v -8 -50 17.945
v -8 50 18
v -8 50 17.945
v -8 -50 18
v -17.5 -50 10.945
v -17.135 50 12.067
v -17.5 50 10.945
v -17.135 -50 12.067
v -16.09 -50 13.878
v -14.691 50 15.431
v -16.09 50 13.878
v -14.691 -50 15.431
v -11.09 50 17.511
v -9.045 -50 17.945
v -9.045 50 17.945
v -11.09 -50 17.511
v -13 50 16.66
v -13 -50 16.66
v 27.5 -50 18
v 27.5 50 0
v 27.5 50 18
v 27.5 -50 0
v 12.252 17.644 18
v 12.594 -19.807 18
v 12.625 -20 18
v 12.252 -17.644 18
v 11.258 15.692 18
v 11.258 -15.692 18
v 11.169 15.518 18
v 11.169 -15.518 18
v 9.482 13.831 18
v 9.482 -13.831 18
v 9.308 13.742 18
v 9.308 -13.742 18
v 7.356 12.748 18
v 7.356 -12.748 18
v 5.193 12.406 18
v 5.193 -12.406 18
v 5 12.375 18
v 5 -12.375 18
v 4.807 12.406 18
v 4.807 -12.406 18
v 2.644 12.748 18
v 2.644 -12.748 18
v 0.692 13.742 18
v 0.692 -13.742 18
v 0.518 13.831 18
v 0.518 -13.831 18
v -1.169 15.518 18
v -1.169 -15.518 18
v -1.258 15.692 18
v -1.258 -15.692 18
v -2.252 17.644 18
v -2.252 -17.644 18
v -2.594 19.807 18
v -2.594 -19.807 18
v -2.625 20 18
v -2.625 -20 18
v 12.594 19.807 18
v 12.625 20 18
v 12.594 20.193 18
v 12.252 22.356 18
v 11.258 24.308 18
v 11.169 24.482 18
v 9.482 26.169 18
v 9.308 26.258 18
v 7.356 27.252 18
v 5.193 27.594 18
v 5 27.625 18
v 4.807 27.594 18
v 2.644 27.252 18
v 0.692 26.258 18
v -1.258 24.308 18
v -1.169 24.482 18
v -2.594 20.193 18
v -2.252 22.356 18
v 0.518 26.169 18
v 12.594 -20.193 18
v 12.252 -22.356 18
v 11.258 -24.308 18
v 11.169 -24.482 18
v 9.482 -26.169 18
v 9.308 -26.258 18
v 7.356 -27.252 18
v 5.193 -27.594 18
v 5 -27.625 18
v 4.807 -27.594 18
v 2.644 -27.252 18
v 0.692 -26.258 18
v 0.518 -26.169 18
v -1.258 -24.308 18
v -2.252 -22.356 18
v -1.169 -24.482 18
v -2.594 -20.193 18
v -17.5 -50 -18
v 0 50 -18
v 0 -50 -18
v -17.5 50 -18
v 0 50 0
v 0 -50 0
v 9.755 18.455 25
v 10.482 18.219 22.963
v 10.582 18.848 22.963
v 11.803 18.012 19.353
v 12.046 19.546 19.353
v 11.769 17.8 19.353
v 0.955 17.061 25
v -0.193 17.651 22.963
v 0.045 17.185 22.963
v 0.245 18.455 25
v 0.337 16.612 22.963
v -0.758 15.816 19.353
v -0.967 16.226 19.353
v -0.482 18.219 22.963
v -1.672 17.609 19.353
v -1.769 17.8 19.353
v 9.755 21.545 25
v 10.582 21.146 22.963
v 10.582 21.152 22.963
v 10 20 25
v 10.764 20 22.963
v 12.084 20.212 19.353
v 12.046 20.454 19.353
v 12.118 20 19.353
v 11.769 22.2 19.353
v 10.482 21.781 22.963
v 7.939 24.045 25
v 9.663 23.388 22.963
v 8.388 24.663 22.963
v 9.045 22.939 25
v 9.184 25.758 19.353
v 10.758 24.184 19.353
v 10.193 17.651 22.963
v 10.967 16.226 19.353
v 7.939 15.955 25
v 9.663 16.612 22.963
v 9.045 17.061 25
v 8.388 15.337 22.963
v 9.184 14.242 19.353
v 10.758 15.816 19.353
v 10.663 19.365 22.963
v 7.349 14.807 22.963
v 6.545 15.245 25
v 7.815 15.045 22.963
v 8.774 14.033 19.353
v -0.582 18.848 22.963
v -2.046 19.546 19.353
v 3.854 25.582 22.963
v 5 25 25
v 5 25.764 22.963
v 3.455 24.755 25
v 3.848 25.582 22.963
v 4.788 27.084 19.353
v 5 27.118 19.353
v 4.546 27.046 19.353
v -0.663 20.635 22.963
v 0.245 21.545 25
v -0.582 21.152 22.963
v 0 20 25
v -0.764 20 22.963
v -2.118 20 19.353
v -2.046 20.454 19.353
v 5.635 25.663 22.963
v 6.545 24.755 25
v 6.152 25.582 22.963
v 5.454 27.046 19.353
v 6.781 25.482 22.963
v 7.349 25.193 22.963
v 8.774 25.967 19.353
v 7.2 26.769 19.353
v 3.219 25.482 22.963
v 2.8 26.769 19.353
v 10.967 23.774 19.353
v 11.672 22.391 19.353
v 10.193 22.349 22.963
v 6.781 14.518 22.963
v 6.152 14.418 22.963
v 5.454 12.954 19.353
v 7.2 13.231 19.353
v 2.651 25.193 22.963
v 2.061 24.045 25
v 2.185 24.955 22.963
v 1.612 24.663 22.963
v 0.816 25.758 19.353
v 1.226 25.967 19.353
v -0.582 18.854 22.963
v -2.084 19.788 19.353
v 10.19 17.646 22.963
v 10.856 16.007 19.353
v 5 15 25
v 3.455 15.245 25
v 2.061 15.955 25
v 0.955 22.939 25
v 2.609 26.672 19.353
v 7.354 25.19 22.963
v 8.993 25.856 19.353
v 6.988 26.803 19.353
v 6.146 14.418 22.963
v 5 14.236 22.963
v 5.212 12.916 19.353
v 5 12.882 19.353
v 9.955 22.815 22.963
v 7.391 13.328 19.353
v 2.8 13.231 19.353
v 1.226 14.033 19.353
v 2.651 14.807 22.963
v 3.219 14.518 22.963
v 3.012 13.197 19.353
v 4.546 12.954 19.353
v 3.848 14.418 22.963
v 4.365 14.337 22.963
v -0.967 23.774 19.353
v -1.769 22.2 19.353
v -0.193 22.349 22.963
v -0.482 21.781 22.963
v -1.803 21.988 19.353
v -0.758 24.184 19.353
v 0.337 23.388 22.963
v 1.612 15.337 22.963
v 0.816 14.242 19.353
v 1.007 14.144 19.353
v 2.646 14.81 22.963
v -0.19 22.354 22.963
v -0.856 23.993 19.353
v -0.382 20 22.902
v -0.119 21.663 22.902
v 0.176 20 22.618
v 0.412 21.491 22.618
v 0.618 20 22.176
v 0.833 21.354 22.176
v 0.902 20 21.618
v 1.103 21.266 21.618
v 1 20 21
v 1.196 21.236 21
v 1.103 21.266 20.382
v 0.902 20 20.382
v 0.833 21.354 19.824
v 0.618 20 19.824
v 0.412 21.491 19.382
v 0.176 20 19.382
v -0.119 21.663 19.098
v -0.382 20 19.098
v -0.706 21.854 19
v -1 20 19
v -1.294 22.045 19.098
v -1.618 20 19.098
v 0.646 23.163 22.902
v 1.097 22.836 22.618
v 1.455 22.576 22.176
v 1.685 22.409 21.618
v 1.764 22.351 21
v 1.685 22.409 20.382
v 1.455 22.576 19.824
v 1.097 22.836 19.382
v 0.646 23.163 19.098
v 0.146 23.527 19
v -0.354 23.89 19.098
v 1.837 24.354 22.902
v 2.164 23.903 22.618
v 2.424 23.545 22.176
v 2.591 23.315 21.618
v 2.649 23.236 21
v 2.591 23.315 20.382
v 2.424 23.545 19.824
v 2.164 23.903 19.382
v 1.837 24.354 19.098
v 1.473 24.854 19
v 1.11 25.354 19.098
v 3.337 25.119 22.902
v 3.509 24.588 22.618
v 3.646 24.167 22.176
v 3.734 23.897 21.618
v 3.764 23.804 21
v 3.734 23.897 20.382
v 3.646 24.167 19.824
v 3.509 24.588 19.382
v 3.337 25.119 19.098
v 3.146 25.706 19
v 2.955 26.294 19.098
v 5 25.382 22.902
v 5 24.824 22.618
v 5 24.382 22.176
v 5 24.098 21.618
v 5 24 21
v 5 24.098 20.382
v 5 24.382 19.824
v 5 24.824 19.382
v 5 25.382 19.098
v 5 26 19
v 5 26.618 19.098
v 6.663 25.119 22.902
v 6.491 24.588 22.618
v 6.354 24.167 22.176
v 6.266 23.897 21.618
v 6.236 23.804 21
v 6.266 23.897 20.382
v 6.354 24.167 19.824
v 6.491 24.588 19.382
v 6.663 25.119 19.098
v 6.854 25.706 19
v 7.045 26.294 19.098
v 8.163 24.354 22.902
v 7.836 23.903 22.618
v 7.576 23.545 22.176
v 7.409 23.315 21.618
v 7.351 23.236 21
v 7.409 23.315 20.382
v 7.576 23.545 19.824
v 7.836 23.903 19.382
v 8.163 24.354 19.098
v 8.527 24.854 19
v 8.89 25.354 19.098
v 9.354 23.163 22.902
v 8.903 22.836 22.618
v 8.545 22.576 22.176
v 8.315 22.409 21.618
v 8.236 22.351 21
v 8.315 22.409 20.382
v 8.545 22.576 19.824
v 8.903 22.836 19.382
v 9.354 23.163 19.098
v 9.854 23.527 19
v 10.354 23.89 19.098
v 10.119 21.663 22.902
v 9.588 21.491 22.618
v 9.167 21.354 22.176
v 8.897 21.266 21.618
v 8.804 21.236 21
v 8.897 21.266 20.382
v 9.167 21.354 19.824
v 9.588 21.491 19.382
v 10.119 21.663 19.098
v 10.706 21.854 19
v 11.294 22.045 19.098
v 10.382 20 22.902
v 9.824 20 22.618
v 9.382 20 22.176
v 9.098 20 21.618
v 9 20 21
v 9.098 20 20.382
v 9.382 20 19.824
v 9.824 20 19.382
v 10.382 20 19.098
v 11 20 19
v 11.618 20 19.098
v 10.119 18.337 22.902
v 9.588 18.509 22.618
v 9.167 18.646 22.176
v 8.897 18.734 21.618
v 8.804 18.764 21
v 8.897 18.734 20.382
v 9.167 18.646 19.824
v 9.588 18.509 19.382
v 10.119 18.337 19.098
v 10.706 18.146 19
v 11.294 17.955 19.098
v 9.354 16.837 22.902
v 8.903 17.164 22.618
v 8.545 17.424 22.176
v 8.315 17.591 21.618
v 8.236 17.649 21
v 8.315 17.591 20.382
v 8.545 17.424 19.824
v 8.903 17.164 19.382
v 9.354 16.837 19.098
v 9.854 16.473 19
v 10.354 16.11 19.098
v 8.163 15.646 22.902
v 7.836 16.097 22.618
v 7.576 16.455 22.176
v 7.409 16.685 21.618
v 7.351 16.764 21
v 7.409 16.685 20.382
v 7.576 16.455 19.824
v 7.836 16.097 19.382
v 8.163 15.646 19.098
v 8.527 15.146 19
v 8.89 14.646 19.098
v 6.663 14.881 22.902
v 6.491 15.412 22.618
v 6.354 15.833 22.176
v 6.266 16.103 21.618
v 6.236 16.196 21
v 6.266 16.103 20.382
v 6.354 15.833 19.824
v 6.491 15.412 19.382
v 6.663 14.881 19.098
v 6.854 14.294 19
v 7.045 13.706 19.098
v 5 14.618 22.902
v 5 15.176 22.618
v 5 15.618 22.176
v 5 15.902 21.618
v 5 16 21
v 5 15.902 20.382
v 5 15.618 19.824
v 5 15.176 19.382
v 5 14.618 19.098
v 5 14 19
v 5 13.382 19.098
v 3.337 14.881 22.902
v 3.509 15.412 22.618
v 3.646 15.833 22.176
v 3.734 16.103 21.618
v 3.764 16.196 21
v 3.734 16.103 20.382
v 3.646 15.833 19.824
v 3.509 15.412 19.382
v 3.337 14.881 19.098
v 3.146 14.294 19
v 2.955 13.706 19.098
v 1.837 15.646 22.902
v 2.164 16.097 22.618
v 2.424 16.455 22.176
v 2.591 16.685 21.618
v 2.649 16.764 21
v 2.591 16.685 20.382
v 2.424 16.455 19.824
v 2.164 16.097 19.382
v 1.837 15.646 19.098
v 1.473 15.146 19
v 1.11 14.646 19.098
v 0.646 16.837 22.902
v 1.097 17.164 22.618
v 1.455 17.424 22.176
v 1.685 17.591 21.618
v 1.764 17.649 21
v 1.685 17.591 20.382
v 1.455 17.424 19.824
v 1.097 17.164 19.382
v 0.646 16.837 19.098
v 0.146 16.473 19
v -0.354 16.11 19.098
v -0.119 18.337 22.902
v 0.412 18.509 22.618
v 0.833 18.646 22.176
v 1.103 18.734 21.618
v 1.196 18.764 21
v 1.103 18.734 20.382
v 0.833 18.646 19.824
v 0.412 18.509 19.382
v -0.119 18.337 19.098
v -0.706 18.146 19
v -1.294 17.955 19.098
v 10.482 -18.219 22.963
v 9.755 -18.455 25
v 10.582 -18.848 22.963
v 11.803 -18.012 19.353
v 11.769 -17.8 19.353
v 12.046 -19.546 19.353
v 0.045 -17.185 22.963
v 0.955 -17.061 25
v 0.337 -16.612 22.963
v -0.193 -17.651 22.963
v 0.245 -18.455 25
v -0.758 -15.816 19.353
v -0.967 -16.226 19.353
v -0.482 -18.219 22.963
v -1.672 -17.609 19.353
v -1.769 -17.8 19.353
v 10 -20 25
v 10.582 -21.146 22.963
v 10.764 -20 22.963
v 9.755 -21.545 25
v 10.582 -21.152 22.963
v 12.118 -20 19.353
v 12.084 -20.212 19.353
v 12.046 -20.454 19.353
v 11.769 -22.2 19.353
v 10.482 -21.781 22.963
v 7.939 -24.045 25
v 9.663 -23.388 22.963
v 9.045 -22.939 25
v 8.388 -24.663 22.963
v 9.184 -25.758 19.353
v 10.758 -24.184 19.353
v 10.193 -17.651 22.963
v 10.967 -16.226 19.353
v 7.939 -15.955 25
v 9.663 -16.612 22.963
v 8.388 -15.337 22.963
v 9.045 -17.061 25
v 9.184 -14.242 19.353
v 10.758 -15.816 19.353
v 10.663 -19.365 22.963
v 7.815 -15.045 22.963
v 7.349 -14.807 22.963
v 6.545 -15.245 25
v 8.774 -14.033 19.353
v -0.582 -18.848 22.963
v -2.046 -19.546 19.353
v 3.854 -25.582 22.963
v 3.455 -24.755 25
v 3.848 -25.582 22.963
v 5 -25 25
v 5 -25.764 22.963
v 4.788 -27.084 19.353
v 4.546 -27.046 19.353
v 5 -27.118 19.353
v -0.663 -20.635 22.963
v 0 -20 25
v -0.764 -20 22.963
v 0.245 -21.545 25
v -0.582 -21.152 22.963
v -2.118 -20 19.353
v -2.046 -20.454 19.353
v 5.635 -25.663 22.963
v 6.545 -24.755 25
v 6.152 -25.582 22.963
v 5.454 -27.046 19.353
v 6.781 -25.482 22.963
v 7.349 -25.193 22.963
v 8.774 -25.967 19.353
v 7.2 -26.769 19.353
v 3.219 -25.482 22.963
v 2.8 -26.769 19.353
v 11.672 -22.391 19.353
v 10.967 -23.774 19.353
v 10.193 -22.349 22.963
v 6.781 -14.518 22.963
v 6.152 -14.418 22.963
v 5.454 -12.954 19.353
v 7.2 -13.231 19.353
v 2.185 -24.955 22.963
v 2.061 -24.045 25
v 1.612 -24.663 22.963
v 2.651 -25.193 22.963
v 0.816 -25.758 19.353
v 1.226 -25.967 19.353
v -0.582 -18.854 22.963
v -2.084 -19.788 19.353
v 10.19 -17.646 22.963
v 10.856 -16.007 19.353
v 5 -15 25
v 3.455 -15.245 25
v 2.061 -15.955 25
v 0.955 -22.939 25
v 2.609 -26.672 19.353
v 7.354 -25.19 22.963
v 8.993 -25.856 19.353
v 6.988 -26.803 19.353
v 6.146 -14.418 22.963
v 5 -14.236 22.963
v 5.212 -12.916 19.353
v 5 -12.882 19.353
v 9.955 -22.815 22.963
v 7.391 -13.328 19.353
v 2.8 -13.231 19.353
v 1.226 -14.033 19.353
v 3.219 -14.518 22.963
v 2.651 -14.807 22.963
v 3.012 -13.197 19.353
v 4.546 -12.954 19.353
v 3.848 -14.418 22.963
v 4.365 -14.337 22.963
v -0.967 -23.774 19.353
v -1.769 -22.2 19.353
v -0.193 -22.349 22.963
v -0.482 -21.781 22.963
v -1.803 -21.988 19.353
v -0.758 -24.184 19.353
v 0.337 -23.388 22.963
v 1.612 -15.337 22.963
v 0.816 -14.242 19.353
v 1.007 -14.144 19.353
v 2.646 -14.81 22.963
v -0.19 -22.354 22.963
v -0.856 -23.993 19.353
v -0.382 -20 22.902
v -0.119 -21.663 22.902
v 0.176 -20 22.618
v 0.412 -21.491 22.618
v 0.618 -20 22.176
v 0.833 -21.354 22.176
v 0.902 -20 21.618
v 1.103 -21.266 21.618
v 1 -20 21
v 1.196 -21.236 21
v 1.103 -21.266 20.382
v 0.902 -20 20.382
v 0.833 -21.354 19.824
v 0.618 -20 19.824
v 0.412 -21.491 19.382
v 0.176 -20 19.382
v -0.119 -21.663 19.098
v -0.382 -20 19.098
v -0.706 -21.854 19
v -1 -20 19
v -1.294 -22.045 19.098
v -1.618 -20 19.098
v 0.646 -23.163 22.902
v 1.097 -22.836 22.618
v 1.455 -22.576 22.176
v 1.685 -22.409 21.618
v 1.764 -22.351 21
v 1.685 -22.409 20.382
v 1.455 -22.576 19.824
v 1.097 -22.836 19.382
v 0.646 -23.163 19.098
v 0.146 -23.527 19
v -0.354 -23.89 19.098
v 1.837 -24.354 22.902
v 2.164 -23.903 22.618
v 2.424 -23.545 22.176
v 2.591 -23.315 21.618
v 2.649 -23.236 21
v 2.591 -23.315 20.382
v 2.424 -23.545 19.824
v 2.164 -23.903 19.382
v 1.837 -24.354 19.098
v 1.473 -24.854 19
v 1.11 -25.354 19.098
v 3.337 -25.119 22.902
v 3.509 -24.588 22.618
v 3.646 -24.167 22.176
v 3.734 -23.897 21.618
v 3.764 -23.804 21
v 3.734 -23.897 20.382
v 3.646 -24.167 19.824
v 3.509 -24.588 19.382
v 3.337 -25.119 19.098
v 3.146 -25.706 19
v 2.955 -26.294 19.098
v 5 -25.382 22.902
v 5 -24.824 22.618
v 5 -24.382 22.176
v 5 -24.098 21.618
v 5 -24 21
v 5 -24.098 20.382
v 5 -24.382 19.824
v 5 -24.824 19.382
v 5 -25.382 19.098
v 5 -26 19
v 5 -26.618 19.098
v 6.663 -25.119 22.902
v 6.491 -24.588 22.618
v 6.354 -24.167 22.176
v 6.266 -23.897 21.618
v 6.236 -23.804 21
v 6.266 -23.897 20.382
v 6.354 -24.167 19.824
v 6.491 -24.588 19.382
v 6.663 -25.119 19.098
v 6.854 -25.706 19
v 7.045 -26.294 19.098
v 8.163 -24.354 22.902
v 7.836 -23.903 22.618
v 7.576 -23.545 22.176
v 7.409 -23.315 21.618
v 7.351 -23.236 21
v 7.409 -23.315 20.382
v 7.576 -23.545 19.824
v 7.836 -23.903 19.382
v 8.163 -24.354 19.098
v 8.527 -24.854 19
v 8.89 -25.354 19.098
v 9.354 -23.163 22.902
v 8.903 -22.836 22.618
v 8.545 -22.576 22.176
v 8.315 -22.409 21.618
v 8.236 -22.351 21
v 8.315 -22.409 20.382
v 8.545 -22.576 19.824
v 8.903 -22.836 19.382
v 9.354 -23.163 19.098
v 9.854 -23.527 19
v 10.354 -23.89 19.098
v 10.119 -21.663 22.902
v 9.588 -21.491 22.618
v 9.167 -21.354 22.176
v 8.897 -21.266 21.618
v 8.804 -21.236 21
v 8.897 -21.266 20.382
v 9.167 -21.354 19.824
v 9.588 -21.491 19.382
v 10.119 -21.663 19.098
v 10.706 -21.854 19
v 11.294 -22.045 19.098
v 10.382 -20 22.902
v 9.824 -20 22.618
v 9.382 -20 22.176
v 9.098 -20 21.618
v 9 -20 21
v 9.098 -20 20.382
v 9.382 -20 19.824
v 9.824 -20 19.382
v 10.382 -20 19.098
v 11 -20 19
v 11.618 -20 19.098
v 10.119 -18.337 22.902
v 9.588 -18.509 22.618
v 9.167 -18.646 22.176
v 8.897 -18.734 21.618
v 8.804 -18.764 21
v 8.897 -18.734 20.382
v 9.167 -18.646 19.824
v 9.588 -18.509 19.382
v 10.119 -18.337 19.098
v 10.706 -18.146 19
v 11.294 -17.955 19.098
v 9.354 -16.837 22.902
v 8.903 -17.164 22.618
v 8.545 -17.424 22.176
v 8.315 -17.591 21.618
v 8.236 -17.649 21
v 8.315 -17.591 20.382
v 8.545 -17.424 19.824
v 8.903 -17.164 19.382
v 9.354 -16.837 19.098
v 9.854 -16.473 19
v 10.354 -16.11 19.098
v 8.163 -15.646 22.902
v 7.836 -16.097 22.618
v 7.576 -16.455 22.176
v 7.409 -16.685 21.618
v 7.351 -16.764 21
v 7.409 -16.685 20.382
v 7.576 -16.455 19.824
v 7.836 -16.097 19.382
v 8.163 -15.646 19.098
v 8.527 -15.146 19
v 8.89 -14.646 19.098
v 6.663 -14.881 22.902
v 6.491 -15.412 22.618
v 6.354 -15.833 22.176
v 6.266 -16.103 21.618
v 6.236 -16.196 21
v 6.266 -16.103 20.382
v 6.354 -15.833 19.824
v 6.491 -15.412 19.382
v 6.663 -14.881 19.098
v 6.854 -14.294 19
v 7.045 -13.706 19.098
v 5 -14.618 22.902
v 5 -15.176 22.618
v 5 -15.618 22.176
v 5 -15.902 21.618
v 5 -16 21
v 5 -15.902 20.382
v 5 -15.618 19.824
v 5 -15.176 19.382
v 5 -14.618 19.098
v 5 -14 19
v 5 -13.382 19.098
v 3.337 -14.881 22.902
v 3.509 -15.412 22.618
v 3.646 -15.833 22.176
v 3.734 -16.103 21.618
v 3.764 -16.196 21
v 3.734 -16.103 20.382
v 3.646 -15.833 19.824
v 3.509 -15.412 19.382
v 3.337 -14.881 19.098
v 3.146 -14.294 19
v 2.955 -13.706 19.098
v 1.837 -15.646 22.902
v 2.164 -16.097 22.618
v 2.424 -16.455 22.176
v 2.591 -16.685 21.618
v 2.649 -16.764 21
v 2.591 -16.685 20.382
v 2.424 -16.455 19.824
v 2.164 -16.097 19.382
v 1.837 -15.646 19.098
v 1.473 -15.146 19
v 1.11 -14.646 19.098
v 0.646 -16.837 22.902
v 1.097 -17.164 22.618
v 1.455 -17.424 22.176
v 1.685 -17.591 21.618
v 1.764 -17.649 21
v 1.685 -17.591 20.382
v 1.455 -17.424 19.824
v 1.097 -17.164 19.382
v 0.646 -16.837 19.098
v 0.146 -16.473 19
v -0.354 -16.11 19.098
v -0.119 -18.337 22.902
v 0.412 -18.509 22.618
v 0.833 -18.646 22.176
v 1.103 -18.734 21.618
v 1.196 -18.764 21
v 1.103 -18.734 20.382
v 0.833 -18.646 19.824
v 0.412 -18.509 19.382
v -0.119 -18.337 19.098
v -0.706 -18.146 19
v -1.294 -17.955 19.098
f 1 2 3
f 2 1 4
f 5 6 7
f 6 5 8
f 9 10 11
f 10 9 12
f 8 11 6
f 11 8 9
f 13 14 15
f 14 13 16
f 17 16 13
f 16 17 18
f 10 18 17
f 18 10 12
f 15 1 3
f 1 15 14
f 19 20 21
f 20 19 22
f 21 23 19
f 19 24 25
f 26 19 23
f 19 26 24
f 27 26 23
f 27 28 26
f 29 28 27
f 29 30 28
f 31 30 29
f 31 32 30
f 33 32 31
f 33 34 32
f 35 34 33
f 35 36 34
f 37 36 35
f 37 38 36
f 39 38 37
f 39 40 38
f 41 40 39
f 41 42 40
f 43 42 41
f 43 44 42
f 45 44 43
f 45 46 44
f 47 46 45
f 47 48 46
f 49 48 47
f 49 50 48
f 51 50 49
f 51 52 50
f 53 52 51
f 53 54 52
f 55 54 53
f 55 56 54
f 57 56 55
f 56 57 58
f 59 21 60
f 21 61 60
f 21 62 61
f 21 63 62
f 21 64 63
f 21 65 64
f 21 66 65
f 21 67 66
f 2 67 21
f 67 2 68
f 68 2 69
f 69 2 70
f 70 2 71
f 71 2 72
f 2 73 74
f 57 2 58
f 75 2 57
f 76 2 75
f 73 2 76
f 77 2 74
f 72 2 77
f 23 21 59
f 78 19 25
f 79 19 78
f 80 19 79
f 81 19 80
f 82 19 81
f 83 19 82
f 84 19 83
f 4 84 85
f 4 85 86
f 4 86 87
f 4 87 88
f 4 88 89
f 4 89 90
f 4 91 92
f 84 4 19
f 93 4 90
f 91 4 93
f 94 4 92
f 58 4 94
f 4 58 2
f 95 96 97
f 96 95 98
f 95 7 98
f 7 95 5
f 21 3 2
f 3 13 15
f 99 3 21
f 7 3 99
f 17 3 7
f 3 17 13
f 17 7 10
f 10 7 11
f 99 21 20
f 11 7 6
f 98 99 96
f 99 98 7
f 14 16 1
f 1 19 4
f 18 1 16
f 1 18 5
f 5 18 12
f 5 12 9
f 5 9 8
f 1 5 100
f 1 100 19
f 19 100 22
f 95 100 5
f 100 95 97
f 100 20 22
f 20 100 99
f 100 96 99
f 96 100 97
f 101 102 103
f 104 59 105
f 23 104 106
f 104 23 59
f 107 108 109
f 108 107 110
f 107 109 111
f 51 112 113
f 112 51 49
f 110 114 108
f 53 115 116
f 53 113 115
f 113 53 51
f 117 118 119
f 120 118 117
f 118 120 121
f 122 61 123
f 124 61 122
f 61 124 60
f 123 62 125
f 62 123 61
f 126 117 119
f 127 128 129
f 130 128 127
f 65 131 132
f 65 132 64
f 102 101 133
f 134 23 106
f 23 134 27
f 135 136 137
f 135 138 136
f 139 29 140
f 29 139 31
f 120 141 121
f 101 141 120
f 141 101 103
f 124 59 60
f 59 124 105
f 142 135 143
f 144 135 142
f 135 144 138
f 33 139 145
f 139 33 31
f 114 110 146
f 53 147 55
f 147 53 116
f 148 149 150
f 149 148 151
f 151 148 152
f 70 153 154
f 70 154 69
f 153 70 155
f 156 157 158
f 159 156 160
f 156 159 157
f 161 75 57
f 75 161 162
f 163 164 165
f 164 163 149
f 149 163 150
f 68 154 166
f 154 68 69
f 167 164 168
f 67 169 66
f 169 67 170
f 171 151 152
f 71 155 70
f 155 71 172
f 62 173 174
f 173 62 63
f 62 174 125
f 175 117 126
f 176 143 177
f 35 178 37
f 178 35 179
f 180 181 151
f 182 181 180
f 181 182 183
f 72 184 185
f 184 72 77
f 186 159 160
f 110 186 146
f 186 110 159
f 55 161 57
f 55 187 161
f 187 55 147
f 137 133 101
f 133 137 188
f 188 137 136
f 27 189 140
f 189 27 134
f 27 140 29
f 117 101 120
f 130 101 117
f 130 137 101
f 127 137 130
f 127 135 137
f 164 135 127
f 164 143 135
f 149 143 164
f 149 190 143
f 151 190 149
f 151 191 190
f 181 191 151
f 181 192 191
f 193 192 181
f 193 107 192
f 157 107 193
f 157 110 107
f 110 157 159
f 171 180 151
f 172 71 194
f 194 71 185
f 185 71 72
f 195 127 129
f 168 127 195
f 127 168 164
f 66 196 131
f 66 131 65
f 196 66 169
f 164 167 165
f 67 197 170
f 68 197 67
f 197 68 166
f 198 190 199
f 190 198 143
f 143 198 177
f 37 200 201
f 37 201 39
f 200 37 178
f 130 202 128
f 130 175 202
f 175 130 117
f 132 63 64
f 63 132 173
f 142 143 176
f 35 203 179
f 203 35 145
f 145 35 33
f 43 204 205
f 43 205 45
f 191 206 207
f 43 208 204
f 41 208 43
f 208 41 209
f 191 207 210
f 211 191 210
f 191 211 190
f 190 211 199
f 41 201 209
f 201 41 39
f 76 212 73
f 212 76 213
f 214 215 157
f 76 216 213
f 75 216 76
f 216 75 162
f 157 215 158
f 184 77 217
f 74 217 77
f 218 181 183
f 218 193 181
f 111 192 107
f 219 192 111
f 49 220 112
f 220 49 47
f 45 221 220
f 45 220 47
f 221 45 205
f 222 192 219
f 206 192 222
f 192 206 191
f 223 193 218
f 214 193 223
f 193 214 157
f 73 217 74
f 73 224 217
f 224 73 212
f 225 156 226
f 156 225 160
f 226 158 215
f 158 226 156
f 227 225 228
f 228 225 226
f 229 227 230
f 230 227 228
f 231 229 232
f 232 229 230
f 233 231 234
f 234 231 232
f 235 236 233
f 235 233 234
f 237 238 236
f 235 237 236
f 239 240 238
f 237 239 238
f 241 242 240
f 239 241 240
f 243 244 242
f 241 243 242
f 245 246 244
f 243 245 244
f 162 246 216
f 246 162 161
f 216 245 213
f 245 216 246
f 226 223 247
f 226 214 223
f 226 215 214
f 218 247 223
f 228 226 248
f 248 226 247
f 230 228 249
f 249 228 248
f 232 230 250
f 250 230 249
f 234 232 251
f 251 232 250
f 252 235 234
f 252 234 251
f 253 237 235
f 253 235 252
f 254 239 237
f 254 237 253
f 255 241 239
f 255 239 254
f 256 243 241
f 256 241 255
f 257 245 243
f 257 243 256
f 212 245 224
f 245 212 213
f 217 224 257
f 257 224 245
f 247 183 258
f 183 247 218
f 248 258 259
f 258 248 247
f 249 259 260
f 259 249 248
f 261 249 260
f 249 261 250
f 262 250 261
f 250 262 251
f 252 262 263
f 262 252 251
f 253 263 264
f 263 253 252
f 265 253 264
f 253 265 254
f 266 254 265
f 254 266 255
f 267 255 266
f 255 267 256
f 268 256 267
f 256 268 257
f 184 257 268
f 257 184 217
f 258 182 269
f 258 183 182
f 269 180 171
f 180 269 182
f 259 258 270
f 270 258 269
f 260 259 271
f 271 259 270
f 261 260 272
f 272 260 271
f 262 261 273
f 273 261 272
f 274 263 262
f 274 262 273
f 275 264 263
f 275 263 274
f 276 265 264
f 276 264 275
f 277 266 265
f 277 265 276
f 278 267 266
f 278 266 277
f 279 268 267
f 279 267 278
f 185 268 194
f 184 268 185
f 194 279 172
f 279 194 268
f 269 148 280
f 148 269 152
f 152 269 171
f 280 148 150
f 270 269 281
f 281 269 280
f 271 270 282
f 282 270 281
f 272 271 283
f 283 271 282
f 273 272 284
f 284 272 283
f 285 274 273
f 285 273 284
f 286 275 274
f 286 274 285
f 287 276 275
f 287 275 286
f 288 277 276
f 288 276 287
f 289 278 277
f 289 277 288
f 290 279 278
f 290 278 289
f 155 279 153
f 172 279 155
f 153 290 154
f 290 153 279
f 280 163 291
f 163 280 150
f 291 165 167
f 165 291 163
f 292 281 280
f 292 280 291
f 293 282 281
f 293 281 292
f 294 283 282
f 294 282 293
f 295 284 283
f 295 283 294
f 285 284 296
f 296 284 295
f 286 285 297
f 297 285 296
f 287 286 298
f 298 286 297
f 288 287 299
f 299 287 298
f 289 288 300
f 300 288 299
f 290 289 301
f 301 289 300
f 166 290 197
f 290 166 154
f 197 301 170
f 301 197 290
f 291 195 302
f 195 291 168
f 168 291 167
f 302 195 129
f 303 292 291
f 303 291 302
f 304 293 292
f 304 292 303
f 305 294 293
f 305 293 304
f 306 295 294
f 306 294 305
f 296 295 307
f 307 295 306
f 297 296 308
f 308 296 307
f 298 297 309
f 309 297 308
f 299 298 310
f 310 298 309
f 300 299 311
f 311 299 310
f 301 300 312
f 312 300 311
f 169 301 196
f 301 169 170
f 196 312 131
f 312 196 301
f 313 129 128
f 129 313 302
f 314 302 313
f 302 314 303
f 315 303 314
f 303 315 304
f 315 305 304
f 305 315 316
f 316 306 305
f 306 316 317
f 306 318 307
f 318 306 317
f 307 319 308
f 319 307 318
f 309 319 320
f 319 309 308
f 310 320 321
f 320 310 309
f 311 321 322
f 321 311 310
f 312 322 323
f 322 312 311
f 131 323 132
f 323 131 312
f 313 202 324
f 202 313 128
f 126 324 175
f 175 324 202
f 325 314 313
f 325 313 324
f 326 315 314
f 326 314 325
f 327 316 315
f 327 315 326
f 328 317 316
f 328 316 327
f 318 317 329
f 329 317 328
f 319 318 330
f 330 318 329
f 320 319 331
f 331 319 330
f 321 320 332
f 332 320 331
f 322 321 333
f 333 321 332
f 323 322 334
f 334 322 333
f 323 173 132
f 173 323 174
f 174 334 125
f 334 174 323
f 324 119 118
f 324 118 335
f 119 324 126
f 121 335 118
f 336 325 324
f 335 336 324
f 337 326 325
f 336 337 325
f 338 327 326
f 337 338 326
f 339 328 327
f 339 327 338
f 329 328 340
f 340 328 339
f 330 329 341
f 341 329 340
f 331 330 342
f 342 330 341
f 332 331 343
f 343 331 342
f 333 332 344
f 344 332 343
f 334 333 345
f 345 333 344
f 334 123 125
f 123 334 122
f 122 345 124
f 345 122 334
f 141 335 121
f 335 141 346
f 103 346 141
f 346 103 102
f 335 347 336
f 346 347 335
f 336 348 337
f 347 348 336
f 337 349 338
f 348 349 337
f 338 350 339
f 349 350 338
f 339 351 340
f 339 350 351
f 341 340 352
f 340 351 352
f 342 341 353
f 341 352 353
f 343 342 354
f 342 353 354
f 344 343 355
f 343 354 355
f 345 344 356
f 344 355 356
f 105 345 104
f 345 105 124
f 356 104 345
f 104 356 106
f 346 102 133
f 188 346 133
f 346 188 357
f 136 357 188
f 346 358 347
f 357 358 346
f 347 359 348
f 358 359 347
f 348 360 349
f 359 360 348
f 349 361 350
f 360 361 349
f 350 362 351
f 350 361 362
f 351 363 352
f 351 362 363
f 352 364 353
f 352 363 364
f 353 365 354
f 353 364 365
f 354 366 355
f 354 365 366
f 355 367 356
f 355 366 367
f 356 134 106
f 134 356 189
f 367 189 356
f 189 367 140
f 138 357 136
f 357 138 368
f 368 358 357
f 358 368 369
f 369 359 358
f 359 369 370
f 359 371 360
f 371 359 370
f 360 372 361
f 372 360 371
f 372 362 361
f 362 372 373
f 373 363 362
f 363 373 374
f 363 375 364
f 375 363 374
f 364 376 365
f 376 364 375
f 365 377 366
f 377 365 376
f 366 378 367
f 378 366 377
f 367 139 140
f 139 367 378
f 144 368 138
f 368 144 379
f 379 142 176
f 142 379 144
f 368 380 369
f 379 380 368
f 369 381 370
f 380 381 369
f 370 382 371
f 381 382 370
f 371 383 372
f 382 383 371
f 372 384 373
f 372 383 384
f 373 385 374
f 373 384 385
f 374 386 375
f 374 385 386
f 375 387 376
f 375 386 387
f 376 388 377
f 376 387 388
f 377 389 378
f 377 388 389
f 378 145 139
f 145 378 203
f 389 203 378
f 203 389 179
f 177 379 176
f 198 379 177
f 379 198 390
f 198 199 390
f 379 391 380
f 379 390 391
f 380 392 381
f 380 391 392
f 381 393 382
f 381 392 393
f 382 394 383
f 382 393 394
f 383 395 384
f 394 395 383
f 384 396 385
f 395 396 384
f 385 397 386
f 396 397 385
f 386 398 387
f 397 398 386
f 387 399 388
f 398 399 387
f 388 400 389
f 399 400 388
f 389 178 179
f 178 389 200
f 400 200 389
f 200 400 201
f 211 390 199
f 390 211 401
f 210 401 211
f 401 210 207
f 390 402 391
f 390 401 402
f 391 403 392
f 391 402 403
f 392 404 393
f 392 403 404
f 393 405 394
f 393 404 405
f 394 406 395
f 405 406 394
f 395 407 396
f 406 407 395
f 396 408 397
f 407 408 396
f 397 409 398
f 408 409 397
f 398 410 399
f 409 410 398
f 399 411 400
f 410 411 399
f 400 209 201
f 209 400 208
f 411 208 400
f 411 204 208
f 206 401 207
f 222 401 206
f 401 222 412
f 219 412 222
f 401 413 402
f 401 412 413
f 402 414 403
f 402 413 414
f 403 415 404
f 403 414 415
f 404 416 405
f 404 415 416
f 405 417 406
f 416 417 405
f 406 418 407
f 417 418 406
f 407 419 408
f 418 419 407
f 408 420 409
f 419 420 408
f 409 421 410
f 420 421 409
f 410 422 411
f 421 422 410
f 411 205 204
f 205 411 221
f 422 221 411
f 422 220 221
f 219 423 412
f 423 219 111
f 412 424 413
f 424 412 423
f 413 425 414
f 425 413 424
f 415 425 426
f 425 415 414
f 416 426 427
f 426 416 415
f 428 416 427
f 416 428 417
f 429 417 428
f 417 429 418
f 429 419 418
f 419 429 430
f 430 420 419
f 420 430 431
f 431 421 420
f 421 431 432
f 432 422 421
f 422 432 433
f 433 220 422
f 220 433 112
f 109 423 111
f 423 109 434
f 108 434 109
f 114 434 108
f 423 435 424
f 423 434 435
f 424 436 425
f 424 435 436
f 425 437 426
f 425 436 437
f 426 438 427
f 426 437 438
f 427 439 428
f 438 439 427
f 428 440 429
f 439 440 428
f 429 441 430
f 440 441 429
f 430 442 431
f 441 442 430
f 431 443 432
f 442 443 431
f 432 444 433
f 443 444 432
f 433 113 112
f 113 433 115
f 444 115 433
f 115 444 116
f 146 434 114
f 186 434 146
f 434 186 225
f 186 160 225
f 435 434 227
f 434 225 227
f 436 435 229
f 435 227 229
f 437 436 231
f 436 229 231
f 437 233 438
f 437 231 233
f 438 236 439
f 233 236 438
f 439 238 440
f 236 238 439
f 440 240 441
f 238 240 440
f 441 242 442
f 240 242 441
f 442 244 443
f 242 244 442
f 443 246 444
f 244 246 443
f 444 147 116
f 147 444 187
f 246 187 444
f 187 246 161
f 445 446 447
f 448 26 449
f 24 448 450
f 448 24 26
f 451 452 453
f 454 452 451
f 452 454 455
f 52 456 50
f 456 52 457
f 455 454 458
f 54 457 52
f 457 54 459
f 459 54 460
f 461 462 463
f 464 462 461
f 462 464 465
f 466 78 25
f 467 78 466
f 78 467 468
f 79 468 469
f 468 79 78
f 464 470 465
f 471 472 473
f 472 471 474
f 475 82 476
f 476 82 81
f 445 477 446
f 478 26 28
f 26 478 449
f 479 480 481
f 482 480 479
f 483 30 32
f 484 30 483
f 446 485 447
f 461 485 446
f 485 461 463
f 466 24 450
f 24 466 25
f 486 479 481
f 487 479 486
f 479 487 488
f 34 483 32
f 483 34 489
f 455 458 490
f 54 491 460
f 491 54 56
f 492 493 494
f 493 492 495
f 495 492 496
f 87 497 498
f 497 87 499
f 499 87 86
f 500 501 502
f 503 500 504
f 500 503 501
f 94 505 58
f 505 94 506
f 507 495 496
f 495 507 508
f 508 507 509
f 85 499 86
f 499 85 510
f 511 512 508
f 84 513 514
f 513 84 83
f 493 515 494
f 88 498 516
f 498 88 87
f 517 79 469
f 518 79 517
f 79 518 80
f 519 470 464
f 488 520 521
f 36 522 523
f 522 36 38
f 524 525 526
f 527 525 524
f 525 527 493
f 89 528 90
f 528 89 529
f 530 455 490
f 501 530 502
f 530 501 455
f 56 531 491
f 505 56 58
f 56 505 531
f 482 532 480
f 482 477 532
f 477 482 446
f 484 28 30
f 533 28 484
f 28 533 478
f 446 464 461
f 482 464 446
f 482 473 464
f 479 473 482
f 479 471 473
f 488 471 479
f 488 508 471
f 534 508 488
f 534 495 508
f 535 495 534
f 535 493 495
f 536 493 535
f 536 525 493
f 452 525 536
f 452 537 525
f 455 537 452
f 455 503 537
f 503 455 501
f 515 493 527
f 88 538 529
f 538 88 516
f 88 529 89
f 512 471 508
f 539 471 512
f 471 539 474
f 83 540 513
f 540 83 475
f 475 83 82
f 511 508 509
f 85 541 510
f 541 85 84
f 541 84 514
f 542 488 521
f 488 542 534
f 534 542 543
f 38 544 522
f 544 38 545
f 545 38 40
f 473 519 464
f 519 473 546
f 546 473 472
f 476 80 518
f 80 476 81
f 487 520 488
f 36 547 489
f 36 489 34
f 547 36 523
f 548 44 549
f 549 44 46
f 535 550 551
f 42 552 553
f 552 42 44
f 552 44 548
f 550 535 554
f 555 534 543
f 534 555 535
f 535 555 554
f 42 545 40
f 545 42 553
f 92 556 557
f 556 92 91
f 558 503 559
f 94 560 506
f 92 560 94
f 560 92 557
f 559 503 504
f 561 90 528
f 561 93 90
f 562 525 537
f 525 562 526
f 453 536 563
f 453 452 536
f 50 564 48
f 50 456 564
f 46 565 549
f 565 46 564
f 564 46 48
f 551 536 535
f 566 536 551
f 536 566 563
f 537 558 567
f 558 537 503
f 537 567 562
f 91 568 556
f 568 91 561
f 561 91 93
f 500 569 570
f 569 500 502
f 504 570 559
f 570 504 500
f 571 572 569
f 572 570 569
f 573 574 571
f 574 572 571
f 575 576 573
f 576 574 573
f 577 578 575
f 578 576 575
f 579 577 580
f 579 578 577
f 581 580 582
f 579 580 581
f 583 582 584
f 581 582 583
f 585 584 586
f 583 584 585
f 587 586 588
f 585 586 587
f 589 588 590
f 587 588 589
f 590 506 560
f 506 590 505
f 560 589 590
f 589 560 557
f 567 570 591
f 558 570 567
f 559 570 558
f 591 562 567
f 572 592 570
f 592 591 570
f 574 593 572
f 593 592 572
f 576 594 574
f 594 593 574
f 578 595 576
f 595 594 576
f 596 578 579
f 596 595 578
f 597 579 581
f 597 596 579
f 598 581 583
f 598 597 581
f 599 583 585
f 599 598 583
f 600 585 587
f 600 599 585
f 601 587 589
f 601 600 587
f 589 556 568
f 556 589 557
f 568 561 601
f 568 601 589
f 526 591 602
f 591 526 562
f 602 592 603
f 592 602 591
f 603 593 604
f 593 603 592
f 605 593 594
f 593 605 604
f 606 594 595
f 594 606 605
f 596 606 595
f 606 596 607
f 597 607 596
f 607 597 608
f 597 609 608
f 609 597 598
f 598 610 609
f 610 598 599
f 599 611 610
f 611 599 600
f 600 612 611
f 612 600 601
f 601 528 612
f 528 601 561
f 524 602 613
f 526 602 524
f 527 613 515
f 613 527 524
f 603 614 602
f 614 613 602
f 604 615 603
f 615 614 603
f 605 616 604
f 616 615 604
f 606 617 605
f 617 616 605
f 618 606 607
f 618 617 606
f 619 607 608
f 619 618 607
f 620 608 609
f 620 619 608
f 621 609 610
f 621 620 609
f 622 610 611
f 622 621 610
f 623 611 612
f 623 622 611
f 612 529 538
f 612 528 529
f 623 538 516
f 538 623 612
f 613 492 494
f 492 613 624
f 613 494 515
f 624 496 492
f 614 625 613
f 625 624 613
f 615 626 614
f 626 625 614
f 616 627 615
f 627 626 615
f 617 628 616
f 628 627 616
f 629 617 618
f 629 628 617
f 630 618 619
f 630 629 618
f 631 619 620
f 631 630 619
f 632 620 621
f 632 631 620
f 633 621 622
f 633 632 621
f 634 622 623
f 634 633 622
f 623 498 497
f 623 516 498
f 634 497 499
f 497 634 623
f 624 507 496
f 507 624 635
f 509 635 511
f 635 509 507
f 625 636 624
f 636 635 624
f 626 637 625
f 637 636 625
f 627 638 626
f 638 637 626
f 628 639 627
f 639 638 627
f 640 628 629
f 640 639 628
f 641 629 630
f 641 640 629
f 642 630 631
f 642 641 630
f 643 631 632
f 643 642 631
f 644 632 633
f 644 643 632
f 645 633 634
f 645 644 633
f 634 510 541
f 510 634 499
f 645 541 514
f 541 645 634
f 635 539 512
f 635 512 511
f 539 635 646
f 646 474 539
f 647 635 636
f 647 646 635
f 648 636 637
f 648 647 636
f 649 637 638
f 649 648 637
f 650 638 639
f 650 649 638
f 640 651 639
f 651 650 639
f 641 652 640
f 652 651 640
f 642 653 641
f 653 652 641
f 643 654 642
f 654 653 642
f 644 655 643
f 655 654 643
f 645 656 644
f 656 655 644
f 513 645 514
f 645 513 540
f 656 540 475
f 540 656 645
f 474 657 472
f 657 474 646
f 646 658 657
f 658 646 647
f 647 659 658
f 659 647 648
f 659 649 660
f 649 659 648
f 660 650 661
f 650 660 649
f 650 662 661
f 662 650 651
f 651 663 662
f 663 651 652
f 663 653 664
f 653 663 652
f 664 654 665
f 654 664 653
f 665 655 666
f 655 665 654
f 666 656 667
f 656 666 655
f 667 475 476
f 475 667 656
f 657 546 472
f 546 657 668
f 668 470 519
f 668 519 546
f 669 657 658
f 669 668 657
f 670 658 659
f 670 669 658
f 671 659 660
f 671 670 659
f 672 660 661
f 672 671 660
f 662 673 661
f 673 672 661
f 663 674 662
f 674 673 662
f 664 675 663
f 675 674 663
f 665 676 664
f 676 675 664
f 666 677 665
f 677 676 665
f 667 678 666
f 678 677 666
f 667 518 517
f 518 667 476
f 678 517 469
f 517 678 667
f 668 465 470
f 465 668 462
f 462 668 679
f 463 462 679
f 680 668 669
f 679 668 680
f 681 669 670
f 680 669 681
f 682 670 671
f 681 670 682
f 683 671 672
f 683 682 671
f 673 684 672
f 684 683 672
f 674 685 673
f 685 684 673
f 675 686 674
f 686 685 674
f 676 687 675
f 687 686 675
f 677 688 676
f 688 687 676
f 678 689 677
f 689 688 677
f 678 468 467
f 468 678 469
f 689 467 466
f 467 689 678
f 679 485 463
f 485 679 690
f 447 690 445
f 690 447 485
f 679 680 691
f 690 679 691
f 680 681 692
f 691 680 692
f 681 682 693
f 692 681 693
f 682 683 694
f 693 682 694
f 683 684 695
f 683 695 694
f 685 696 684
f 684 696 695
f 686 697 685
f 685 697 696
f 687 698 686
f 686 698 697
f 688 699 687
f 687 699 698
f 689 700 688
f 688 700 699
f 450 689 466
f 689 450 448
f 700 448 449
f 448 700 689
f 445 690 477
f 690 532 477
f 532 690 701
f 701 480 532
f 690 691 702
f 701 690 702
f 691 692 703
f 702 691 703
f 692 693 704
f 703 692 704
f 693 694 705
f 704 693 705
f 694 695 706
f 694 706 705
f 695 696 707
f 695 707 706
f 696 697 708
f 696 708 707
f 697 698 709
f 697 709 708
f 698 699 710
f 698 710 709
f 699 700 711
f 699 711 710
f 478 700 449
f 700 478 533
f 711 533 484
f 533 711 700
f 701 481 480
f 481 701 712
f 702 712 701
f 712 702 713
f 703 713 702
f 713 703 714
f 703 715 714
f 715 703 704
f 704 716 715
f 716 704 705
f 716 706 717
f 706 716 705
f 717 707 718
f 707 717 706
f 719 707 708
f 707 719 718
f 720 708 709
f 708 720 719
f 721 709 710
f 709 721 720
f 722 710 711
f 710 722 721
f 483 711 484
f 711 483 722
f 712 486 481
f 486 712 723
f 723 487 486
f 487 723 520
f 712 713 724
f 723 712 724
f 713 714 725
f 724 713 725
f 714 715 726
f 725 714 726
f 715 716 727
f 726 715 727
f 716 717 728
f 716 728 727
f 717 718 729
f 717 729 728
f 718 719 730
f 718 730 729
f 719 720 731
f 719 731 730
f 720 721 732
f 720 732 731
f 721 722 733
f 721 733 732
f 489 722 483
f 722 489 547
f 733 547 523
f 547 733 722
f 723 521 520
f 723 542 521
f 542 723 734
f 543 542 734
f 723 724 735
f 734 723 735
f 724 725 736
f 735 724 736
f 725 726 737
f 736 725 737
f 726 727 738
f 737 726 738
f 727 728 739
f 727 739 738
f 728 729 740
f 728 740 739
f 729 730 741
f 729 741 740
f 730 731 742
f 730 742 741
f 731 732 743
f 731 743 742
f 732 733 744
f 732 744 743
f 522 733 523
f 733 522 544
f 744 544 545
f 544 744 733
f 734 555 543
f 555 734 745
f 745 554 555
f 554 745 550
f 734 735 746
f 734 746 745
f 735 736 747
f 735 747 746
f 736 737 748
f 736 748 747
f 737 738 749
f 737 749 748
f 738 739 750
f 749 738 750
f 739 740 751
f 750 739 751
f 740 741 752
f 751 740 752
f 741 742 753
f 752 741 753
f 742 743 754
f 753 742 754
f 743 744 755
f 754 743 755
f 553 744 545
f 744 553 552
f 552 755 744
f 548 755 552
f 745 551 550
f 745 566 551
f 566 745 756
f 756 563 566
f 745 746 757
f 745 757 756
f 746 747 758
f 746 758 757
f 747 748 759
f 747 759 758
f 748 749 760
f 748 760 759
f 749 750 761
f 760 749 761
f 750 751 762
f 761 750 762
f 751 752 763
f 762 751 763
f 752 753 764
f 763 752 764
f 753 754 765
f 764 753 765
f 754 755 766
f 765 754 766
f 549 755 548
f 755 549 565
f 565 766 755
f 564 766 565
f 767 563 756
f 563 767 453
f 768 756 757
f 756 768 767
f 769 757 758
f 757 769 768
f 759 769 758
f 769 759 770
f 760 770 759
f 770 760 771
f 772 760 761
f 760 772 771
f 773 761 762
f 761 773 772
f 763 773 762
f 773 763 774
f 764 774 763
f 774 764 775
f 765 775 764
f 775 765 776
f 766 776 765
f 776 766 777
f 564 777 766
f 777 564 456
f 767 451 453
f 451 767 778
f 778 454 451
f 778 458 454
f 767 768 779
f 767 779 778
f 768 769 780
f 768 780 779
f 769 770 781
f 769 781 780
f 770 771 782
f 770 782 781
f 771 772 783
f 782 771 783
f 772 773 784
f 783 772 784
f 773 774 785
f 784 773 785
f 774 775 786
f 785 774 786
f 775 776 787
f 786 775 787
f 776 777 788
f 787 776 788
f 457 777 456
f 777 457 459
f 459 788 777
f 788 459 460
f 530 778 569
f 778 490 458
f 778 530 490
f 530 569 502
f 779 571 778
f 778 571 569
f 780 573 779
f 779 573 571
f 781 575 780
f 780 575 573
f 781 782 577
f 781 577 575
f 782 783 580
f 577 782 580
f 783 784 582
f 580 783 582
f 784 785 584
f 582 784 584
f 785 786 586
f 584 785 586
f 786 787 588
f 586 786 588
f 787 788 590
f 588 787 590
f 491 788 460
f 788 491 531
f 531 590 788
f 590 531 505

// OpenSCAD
// file: Polea_baja.scad
$fn=20;
radius_bar =2; //mm
bend_radius =4; //long wheel

module Polea_baja(){
	difference() {
	    cylinder(r1=8, r2=5,h=8 ,center=true);
	    
	    rotate_extrude()
	    translate([bend_radius + radius_bar, 0, 0])
		circle(r=radius_bar);
	}
}

Polea_baja();
// file: Mirror.scad
module mirrorXY(Pos=[10,10,0])
 {
    translate(Pos)
        child();
    
    mirror([1,0,0])
        translate(Pos)
            child();
    mirror([0,1,0])
        translate(Pos)
           child();

    mirror([1,0,0])
        mirror([0,1,0])
            translate(Pos)
                child();
}

// Módulos
module mirrorX(Pos=[10,10,0])
 {
    translate(Pos)
        child(); 
    mirror([1,0,0])
        translate(Pos)
            child();
}

module mirrorY(Pos=[10,10,0])
 {
    translate(Pos)
        child(); 
    mirror([0,1,0])
        translate(Pos)
           child();
}

module mirrorZ(Pos=[10,10,0])
 {
    translate(Pos)
        child(); 	
    mirror([0,1,0])
        translate(Pos)
           child();
}
// main file
Dist_bar=40; //distancia de una varilla al centro
radius_bar =5.3; //mm
largo_bar=100;
pos_bar=[0,Dist_bar,9];
margen_bar=1;
ancho_cristal=5.5+0.4;
ancho_pestanita=6;

use <Mirror.scad>
use <Polea_baja.scad>

Altura_Base=36;
Anchura_Base= (Dist_bar*2)+20;
Largo_Base=45;

module varilla(){
    translate([largo_bar/2,0,0])
        rotate([0,90,0])
        cylinder(r=radius_bar+margen_bar, h=largo_bar,center=true,$fn=100);
}


module wagon(){
    difference(){
        translate([5,0,0])
        cube([Largo_Base,Anchura_Base,Altura_Base],center=true);
        
        translate([0,-Anchura_Base/2-5,-Altura_Base])
            cube([Largo_Base,Anchura_Base+10,Altura_Base]);
        
        %mirrorY(pos_bar)
            varilla();

        difference(){
            translate([-Largo_Base-8,-(Anchura_Base+5)/2,0+8])
             cube([Largo_Base,Anchura_Base+5,Altura_Base]);
            
            translate([-8,0,8])
            rotate([90,0,0])
            cylinder(r=10,h=Anchura_Base+6,center=true);   
        }

    }
    
    mirrorY([5,Dist_bar/2,21])
        Polea_baja();

    
}

wagon();
